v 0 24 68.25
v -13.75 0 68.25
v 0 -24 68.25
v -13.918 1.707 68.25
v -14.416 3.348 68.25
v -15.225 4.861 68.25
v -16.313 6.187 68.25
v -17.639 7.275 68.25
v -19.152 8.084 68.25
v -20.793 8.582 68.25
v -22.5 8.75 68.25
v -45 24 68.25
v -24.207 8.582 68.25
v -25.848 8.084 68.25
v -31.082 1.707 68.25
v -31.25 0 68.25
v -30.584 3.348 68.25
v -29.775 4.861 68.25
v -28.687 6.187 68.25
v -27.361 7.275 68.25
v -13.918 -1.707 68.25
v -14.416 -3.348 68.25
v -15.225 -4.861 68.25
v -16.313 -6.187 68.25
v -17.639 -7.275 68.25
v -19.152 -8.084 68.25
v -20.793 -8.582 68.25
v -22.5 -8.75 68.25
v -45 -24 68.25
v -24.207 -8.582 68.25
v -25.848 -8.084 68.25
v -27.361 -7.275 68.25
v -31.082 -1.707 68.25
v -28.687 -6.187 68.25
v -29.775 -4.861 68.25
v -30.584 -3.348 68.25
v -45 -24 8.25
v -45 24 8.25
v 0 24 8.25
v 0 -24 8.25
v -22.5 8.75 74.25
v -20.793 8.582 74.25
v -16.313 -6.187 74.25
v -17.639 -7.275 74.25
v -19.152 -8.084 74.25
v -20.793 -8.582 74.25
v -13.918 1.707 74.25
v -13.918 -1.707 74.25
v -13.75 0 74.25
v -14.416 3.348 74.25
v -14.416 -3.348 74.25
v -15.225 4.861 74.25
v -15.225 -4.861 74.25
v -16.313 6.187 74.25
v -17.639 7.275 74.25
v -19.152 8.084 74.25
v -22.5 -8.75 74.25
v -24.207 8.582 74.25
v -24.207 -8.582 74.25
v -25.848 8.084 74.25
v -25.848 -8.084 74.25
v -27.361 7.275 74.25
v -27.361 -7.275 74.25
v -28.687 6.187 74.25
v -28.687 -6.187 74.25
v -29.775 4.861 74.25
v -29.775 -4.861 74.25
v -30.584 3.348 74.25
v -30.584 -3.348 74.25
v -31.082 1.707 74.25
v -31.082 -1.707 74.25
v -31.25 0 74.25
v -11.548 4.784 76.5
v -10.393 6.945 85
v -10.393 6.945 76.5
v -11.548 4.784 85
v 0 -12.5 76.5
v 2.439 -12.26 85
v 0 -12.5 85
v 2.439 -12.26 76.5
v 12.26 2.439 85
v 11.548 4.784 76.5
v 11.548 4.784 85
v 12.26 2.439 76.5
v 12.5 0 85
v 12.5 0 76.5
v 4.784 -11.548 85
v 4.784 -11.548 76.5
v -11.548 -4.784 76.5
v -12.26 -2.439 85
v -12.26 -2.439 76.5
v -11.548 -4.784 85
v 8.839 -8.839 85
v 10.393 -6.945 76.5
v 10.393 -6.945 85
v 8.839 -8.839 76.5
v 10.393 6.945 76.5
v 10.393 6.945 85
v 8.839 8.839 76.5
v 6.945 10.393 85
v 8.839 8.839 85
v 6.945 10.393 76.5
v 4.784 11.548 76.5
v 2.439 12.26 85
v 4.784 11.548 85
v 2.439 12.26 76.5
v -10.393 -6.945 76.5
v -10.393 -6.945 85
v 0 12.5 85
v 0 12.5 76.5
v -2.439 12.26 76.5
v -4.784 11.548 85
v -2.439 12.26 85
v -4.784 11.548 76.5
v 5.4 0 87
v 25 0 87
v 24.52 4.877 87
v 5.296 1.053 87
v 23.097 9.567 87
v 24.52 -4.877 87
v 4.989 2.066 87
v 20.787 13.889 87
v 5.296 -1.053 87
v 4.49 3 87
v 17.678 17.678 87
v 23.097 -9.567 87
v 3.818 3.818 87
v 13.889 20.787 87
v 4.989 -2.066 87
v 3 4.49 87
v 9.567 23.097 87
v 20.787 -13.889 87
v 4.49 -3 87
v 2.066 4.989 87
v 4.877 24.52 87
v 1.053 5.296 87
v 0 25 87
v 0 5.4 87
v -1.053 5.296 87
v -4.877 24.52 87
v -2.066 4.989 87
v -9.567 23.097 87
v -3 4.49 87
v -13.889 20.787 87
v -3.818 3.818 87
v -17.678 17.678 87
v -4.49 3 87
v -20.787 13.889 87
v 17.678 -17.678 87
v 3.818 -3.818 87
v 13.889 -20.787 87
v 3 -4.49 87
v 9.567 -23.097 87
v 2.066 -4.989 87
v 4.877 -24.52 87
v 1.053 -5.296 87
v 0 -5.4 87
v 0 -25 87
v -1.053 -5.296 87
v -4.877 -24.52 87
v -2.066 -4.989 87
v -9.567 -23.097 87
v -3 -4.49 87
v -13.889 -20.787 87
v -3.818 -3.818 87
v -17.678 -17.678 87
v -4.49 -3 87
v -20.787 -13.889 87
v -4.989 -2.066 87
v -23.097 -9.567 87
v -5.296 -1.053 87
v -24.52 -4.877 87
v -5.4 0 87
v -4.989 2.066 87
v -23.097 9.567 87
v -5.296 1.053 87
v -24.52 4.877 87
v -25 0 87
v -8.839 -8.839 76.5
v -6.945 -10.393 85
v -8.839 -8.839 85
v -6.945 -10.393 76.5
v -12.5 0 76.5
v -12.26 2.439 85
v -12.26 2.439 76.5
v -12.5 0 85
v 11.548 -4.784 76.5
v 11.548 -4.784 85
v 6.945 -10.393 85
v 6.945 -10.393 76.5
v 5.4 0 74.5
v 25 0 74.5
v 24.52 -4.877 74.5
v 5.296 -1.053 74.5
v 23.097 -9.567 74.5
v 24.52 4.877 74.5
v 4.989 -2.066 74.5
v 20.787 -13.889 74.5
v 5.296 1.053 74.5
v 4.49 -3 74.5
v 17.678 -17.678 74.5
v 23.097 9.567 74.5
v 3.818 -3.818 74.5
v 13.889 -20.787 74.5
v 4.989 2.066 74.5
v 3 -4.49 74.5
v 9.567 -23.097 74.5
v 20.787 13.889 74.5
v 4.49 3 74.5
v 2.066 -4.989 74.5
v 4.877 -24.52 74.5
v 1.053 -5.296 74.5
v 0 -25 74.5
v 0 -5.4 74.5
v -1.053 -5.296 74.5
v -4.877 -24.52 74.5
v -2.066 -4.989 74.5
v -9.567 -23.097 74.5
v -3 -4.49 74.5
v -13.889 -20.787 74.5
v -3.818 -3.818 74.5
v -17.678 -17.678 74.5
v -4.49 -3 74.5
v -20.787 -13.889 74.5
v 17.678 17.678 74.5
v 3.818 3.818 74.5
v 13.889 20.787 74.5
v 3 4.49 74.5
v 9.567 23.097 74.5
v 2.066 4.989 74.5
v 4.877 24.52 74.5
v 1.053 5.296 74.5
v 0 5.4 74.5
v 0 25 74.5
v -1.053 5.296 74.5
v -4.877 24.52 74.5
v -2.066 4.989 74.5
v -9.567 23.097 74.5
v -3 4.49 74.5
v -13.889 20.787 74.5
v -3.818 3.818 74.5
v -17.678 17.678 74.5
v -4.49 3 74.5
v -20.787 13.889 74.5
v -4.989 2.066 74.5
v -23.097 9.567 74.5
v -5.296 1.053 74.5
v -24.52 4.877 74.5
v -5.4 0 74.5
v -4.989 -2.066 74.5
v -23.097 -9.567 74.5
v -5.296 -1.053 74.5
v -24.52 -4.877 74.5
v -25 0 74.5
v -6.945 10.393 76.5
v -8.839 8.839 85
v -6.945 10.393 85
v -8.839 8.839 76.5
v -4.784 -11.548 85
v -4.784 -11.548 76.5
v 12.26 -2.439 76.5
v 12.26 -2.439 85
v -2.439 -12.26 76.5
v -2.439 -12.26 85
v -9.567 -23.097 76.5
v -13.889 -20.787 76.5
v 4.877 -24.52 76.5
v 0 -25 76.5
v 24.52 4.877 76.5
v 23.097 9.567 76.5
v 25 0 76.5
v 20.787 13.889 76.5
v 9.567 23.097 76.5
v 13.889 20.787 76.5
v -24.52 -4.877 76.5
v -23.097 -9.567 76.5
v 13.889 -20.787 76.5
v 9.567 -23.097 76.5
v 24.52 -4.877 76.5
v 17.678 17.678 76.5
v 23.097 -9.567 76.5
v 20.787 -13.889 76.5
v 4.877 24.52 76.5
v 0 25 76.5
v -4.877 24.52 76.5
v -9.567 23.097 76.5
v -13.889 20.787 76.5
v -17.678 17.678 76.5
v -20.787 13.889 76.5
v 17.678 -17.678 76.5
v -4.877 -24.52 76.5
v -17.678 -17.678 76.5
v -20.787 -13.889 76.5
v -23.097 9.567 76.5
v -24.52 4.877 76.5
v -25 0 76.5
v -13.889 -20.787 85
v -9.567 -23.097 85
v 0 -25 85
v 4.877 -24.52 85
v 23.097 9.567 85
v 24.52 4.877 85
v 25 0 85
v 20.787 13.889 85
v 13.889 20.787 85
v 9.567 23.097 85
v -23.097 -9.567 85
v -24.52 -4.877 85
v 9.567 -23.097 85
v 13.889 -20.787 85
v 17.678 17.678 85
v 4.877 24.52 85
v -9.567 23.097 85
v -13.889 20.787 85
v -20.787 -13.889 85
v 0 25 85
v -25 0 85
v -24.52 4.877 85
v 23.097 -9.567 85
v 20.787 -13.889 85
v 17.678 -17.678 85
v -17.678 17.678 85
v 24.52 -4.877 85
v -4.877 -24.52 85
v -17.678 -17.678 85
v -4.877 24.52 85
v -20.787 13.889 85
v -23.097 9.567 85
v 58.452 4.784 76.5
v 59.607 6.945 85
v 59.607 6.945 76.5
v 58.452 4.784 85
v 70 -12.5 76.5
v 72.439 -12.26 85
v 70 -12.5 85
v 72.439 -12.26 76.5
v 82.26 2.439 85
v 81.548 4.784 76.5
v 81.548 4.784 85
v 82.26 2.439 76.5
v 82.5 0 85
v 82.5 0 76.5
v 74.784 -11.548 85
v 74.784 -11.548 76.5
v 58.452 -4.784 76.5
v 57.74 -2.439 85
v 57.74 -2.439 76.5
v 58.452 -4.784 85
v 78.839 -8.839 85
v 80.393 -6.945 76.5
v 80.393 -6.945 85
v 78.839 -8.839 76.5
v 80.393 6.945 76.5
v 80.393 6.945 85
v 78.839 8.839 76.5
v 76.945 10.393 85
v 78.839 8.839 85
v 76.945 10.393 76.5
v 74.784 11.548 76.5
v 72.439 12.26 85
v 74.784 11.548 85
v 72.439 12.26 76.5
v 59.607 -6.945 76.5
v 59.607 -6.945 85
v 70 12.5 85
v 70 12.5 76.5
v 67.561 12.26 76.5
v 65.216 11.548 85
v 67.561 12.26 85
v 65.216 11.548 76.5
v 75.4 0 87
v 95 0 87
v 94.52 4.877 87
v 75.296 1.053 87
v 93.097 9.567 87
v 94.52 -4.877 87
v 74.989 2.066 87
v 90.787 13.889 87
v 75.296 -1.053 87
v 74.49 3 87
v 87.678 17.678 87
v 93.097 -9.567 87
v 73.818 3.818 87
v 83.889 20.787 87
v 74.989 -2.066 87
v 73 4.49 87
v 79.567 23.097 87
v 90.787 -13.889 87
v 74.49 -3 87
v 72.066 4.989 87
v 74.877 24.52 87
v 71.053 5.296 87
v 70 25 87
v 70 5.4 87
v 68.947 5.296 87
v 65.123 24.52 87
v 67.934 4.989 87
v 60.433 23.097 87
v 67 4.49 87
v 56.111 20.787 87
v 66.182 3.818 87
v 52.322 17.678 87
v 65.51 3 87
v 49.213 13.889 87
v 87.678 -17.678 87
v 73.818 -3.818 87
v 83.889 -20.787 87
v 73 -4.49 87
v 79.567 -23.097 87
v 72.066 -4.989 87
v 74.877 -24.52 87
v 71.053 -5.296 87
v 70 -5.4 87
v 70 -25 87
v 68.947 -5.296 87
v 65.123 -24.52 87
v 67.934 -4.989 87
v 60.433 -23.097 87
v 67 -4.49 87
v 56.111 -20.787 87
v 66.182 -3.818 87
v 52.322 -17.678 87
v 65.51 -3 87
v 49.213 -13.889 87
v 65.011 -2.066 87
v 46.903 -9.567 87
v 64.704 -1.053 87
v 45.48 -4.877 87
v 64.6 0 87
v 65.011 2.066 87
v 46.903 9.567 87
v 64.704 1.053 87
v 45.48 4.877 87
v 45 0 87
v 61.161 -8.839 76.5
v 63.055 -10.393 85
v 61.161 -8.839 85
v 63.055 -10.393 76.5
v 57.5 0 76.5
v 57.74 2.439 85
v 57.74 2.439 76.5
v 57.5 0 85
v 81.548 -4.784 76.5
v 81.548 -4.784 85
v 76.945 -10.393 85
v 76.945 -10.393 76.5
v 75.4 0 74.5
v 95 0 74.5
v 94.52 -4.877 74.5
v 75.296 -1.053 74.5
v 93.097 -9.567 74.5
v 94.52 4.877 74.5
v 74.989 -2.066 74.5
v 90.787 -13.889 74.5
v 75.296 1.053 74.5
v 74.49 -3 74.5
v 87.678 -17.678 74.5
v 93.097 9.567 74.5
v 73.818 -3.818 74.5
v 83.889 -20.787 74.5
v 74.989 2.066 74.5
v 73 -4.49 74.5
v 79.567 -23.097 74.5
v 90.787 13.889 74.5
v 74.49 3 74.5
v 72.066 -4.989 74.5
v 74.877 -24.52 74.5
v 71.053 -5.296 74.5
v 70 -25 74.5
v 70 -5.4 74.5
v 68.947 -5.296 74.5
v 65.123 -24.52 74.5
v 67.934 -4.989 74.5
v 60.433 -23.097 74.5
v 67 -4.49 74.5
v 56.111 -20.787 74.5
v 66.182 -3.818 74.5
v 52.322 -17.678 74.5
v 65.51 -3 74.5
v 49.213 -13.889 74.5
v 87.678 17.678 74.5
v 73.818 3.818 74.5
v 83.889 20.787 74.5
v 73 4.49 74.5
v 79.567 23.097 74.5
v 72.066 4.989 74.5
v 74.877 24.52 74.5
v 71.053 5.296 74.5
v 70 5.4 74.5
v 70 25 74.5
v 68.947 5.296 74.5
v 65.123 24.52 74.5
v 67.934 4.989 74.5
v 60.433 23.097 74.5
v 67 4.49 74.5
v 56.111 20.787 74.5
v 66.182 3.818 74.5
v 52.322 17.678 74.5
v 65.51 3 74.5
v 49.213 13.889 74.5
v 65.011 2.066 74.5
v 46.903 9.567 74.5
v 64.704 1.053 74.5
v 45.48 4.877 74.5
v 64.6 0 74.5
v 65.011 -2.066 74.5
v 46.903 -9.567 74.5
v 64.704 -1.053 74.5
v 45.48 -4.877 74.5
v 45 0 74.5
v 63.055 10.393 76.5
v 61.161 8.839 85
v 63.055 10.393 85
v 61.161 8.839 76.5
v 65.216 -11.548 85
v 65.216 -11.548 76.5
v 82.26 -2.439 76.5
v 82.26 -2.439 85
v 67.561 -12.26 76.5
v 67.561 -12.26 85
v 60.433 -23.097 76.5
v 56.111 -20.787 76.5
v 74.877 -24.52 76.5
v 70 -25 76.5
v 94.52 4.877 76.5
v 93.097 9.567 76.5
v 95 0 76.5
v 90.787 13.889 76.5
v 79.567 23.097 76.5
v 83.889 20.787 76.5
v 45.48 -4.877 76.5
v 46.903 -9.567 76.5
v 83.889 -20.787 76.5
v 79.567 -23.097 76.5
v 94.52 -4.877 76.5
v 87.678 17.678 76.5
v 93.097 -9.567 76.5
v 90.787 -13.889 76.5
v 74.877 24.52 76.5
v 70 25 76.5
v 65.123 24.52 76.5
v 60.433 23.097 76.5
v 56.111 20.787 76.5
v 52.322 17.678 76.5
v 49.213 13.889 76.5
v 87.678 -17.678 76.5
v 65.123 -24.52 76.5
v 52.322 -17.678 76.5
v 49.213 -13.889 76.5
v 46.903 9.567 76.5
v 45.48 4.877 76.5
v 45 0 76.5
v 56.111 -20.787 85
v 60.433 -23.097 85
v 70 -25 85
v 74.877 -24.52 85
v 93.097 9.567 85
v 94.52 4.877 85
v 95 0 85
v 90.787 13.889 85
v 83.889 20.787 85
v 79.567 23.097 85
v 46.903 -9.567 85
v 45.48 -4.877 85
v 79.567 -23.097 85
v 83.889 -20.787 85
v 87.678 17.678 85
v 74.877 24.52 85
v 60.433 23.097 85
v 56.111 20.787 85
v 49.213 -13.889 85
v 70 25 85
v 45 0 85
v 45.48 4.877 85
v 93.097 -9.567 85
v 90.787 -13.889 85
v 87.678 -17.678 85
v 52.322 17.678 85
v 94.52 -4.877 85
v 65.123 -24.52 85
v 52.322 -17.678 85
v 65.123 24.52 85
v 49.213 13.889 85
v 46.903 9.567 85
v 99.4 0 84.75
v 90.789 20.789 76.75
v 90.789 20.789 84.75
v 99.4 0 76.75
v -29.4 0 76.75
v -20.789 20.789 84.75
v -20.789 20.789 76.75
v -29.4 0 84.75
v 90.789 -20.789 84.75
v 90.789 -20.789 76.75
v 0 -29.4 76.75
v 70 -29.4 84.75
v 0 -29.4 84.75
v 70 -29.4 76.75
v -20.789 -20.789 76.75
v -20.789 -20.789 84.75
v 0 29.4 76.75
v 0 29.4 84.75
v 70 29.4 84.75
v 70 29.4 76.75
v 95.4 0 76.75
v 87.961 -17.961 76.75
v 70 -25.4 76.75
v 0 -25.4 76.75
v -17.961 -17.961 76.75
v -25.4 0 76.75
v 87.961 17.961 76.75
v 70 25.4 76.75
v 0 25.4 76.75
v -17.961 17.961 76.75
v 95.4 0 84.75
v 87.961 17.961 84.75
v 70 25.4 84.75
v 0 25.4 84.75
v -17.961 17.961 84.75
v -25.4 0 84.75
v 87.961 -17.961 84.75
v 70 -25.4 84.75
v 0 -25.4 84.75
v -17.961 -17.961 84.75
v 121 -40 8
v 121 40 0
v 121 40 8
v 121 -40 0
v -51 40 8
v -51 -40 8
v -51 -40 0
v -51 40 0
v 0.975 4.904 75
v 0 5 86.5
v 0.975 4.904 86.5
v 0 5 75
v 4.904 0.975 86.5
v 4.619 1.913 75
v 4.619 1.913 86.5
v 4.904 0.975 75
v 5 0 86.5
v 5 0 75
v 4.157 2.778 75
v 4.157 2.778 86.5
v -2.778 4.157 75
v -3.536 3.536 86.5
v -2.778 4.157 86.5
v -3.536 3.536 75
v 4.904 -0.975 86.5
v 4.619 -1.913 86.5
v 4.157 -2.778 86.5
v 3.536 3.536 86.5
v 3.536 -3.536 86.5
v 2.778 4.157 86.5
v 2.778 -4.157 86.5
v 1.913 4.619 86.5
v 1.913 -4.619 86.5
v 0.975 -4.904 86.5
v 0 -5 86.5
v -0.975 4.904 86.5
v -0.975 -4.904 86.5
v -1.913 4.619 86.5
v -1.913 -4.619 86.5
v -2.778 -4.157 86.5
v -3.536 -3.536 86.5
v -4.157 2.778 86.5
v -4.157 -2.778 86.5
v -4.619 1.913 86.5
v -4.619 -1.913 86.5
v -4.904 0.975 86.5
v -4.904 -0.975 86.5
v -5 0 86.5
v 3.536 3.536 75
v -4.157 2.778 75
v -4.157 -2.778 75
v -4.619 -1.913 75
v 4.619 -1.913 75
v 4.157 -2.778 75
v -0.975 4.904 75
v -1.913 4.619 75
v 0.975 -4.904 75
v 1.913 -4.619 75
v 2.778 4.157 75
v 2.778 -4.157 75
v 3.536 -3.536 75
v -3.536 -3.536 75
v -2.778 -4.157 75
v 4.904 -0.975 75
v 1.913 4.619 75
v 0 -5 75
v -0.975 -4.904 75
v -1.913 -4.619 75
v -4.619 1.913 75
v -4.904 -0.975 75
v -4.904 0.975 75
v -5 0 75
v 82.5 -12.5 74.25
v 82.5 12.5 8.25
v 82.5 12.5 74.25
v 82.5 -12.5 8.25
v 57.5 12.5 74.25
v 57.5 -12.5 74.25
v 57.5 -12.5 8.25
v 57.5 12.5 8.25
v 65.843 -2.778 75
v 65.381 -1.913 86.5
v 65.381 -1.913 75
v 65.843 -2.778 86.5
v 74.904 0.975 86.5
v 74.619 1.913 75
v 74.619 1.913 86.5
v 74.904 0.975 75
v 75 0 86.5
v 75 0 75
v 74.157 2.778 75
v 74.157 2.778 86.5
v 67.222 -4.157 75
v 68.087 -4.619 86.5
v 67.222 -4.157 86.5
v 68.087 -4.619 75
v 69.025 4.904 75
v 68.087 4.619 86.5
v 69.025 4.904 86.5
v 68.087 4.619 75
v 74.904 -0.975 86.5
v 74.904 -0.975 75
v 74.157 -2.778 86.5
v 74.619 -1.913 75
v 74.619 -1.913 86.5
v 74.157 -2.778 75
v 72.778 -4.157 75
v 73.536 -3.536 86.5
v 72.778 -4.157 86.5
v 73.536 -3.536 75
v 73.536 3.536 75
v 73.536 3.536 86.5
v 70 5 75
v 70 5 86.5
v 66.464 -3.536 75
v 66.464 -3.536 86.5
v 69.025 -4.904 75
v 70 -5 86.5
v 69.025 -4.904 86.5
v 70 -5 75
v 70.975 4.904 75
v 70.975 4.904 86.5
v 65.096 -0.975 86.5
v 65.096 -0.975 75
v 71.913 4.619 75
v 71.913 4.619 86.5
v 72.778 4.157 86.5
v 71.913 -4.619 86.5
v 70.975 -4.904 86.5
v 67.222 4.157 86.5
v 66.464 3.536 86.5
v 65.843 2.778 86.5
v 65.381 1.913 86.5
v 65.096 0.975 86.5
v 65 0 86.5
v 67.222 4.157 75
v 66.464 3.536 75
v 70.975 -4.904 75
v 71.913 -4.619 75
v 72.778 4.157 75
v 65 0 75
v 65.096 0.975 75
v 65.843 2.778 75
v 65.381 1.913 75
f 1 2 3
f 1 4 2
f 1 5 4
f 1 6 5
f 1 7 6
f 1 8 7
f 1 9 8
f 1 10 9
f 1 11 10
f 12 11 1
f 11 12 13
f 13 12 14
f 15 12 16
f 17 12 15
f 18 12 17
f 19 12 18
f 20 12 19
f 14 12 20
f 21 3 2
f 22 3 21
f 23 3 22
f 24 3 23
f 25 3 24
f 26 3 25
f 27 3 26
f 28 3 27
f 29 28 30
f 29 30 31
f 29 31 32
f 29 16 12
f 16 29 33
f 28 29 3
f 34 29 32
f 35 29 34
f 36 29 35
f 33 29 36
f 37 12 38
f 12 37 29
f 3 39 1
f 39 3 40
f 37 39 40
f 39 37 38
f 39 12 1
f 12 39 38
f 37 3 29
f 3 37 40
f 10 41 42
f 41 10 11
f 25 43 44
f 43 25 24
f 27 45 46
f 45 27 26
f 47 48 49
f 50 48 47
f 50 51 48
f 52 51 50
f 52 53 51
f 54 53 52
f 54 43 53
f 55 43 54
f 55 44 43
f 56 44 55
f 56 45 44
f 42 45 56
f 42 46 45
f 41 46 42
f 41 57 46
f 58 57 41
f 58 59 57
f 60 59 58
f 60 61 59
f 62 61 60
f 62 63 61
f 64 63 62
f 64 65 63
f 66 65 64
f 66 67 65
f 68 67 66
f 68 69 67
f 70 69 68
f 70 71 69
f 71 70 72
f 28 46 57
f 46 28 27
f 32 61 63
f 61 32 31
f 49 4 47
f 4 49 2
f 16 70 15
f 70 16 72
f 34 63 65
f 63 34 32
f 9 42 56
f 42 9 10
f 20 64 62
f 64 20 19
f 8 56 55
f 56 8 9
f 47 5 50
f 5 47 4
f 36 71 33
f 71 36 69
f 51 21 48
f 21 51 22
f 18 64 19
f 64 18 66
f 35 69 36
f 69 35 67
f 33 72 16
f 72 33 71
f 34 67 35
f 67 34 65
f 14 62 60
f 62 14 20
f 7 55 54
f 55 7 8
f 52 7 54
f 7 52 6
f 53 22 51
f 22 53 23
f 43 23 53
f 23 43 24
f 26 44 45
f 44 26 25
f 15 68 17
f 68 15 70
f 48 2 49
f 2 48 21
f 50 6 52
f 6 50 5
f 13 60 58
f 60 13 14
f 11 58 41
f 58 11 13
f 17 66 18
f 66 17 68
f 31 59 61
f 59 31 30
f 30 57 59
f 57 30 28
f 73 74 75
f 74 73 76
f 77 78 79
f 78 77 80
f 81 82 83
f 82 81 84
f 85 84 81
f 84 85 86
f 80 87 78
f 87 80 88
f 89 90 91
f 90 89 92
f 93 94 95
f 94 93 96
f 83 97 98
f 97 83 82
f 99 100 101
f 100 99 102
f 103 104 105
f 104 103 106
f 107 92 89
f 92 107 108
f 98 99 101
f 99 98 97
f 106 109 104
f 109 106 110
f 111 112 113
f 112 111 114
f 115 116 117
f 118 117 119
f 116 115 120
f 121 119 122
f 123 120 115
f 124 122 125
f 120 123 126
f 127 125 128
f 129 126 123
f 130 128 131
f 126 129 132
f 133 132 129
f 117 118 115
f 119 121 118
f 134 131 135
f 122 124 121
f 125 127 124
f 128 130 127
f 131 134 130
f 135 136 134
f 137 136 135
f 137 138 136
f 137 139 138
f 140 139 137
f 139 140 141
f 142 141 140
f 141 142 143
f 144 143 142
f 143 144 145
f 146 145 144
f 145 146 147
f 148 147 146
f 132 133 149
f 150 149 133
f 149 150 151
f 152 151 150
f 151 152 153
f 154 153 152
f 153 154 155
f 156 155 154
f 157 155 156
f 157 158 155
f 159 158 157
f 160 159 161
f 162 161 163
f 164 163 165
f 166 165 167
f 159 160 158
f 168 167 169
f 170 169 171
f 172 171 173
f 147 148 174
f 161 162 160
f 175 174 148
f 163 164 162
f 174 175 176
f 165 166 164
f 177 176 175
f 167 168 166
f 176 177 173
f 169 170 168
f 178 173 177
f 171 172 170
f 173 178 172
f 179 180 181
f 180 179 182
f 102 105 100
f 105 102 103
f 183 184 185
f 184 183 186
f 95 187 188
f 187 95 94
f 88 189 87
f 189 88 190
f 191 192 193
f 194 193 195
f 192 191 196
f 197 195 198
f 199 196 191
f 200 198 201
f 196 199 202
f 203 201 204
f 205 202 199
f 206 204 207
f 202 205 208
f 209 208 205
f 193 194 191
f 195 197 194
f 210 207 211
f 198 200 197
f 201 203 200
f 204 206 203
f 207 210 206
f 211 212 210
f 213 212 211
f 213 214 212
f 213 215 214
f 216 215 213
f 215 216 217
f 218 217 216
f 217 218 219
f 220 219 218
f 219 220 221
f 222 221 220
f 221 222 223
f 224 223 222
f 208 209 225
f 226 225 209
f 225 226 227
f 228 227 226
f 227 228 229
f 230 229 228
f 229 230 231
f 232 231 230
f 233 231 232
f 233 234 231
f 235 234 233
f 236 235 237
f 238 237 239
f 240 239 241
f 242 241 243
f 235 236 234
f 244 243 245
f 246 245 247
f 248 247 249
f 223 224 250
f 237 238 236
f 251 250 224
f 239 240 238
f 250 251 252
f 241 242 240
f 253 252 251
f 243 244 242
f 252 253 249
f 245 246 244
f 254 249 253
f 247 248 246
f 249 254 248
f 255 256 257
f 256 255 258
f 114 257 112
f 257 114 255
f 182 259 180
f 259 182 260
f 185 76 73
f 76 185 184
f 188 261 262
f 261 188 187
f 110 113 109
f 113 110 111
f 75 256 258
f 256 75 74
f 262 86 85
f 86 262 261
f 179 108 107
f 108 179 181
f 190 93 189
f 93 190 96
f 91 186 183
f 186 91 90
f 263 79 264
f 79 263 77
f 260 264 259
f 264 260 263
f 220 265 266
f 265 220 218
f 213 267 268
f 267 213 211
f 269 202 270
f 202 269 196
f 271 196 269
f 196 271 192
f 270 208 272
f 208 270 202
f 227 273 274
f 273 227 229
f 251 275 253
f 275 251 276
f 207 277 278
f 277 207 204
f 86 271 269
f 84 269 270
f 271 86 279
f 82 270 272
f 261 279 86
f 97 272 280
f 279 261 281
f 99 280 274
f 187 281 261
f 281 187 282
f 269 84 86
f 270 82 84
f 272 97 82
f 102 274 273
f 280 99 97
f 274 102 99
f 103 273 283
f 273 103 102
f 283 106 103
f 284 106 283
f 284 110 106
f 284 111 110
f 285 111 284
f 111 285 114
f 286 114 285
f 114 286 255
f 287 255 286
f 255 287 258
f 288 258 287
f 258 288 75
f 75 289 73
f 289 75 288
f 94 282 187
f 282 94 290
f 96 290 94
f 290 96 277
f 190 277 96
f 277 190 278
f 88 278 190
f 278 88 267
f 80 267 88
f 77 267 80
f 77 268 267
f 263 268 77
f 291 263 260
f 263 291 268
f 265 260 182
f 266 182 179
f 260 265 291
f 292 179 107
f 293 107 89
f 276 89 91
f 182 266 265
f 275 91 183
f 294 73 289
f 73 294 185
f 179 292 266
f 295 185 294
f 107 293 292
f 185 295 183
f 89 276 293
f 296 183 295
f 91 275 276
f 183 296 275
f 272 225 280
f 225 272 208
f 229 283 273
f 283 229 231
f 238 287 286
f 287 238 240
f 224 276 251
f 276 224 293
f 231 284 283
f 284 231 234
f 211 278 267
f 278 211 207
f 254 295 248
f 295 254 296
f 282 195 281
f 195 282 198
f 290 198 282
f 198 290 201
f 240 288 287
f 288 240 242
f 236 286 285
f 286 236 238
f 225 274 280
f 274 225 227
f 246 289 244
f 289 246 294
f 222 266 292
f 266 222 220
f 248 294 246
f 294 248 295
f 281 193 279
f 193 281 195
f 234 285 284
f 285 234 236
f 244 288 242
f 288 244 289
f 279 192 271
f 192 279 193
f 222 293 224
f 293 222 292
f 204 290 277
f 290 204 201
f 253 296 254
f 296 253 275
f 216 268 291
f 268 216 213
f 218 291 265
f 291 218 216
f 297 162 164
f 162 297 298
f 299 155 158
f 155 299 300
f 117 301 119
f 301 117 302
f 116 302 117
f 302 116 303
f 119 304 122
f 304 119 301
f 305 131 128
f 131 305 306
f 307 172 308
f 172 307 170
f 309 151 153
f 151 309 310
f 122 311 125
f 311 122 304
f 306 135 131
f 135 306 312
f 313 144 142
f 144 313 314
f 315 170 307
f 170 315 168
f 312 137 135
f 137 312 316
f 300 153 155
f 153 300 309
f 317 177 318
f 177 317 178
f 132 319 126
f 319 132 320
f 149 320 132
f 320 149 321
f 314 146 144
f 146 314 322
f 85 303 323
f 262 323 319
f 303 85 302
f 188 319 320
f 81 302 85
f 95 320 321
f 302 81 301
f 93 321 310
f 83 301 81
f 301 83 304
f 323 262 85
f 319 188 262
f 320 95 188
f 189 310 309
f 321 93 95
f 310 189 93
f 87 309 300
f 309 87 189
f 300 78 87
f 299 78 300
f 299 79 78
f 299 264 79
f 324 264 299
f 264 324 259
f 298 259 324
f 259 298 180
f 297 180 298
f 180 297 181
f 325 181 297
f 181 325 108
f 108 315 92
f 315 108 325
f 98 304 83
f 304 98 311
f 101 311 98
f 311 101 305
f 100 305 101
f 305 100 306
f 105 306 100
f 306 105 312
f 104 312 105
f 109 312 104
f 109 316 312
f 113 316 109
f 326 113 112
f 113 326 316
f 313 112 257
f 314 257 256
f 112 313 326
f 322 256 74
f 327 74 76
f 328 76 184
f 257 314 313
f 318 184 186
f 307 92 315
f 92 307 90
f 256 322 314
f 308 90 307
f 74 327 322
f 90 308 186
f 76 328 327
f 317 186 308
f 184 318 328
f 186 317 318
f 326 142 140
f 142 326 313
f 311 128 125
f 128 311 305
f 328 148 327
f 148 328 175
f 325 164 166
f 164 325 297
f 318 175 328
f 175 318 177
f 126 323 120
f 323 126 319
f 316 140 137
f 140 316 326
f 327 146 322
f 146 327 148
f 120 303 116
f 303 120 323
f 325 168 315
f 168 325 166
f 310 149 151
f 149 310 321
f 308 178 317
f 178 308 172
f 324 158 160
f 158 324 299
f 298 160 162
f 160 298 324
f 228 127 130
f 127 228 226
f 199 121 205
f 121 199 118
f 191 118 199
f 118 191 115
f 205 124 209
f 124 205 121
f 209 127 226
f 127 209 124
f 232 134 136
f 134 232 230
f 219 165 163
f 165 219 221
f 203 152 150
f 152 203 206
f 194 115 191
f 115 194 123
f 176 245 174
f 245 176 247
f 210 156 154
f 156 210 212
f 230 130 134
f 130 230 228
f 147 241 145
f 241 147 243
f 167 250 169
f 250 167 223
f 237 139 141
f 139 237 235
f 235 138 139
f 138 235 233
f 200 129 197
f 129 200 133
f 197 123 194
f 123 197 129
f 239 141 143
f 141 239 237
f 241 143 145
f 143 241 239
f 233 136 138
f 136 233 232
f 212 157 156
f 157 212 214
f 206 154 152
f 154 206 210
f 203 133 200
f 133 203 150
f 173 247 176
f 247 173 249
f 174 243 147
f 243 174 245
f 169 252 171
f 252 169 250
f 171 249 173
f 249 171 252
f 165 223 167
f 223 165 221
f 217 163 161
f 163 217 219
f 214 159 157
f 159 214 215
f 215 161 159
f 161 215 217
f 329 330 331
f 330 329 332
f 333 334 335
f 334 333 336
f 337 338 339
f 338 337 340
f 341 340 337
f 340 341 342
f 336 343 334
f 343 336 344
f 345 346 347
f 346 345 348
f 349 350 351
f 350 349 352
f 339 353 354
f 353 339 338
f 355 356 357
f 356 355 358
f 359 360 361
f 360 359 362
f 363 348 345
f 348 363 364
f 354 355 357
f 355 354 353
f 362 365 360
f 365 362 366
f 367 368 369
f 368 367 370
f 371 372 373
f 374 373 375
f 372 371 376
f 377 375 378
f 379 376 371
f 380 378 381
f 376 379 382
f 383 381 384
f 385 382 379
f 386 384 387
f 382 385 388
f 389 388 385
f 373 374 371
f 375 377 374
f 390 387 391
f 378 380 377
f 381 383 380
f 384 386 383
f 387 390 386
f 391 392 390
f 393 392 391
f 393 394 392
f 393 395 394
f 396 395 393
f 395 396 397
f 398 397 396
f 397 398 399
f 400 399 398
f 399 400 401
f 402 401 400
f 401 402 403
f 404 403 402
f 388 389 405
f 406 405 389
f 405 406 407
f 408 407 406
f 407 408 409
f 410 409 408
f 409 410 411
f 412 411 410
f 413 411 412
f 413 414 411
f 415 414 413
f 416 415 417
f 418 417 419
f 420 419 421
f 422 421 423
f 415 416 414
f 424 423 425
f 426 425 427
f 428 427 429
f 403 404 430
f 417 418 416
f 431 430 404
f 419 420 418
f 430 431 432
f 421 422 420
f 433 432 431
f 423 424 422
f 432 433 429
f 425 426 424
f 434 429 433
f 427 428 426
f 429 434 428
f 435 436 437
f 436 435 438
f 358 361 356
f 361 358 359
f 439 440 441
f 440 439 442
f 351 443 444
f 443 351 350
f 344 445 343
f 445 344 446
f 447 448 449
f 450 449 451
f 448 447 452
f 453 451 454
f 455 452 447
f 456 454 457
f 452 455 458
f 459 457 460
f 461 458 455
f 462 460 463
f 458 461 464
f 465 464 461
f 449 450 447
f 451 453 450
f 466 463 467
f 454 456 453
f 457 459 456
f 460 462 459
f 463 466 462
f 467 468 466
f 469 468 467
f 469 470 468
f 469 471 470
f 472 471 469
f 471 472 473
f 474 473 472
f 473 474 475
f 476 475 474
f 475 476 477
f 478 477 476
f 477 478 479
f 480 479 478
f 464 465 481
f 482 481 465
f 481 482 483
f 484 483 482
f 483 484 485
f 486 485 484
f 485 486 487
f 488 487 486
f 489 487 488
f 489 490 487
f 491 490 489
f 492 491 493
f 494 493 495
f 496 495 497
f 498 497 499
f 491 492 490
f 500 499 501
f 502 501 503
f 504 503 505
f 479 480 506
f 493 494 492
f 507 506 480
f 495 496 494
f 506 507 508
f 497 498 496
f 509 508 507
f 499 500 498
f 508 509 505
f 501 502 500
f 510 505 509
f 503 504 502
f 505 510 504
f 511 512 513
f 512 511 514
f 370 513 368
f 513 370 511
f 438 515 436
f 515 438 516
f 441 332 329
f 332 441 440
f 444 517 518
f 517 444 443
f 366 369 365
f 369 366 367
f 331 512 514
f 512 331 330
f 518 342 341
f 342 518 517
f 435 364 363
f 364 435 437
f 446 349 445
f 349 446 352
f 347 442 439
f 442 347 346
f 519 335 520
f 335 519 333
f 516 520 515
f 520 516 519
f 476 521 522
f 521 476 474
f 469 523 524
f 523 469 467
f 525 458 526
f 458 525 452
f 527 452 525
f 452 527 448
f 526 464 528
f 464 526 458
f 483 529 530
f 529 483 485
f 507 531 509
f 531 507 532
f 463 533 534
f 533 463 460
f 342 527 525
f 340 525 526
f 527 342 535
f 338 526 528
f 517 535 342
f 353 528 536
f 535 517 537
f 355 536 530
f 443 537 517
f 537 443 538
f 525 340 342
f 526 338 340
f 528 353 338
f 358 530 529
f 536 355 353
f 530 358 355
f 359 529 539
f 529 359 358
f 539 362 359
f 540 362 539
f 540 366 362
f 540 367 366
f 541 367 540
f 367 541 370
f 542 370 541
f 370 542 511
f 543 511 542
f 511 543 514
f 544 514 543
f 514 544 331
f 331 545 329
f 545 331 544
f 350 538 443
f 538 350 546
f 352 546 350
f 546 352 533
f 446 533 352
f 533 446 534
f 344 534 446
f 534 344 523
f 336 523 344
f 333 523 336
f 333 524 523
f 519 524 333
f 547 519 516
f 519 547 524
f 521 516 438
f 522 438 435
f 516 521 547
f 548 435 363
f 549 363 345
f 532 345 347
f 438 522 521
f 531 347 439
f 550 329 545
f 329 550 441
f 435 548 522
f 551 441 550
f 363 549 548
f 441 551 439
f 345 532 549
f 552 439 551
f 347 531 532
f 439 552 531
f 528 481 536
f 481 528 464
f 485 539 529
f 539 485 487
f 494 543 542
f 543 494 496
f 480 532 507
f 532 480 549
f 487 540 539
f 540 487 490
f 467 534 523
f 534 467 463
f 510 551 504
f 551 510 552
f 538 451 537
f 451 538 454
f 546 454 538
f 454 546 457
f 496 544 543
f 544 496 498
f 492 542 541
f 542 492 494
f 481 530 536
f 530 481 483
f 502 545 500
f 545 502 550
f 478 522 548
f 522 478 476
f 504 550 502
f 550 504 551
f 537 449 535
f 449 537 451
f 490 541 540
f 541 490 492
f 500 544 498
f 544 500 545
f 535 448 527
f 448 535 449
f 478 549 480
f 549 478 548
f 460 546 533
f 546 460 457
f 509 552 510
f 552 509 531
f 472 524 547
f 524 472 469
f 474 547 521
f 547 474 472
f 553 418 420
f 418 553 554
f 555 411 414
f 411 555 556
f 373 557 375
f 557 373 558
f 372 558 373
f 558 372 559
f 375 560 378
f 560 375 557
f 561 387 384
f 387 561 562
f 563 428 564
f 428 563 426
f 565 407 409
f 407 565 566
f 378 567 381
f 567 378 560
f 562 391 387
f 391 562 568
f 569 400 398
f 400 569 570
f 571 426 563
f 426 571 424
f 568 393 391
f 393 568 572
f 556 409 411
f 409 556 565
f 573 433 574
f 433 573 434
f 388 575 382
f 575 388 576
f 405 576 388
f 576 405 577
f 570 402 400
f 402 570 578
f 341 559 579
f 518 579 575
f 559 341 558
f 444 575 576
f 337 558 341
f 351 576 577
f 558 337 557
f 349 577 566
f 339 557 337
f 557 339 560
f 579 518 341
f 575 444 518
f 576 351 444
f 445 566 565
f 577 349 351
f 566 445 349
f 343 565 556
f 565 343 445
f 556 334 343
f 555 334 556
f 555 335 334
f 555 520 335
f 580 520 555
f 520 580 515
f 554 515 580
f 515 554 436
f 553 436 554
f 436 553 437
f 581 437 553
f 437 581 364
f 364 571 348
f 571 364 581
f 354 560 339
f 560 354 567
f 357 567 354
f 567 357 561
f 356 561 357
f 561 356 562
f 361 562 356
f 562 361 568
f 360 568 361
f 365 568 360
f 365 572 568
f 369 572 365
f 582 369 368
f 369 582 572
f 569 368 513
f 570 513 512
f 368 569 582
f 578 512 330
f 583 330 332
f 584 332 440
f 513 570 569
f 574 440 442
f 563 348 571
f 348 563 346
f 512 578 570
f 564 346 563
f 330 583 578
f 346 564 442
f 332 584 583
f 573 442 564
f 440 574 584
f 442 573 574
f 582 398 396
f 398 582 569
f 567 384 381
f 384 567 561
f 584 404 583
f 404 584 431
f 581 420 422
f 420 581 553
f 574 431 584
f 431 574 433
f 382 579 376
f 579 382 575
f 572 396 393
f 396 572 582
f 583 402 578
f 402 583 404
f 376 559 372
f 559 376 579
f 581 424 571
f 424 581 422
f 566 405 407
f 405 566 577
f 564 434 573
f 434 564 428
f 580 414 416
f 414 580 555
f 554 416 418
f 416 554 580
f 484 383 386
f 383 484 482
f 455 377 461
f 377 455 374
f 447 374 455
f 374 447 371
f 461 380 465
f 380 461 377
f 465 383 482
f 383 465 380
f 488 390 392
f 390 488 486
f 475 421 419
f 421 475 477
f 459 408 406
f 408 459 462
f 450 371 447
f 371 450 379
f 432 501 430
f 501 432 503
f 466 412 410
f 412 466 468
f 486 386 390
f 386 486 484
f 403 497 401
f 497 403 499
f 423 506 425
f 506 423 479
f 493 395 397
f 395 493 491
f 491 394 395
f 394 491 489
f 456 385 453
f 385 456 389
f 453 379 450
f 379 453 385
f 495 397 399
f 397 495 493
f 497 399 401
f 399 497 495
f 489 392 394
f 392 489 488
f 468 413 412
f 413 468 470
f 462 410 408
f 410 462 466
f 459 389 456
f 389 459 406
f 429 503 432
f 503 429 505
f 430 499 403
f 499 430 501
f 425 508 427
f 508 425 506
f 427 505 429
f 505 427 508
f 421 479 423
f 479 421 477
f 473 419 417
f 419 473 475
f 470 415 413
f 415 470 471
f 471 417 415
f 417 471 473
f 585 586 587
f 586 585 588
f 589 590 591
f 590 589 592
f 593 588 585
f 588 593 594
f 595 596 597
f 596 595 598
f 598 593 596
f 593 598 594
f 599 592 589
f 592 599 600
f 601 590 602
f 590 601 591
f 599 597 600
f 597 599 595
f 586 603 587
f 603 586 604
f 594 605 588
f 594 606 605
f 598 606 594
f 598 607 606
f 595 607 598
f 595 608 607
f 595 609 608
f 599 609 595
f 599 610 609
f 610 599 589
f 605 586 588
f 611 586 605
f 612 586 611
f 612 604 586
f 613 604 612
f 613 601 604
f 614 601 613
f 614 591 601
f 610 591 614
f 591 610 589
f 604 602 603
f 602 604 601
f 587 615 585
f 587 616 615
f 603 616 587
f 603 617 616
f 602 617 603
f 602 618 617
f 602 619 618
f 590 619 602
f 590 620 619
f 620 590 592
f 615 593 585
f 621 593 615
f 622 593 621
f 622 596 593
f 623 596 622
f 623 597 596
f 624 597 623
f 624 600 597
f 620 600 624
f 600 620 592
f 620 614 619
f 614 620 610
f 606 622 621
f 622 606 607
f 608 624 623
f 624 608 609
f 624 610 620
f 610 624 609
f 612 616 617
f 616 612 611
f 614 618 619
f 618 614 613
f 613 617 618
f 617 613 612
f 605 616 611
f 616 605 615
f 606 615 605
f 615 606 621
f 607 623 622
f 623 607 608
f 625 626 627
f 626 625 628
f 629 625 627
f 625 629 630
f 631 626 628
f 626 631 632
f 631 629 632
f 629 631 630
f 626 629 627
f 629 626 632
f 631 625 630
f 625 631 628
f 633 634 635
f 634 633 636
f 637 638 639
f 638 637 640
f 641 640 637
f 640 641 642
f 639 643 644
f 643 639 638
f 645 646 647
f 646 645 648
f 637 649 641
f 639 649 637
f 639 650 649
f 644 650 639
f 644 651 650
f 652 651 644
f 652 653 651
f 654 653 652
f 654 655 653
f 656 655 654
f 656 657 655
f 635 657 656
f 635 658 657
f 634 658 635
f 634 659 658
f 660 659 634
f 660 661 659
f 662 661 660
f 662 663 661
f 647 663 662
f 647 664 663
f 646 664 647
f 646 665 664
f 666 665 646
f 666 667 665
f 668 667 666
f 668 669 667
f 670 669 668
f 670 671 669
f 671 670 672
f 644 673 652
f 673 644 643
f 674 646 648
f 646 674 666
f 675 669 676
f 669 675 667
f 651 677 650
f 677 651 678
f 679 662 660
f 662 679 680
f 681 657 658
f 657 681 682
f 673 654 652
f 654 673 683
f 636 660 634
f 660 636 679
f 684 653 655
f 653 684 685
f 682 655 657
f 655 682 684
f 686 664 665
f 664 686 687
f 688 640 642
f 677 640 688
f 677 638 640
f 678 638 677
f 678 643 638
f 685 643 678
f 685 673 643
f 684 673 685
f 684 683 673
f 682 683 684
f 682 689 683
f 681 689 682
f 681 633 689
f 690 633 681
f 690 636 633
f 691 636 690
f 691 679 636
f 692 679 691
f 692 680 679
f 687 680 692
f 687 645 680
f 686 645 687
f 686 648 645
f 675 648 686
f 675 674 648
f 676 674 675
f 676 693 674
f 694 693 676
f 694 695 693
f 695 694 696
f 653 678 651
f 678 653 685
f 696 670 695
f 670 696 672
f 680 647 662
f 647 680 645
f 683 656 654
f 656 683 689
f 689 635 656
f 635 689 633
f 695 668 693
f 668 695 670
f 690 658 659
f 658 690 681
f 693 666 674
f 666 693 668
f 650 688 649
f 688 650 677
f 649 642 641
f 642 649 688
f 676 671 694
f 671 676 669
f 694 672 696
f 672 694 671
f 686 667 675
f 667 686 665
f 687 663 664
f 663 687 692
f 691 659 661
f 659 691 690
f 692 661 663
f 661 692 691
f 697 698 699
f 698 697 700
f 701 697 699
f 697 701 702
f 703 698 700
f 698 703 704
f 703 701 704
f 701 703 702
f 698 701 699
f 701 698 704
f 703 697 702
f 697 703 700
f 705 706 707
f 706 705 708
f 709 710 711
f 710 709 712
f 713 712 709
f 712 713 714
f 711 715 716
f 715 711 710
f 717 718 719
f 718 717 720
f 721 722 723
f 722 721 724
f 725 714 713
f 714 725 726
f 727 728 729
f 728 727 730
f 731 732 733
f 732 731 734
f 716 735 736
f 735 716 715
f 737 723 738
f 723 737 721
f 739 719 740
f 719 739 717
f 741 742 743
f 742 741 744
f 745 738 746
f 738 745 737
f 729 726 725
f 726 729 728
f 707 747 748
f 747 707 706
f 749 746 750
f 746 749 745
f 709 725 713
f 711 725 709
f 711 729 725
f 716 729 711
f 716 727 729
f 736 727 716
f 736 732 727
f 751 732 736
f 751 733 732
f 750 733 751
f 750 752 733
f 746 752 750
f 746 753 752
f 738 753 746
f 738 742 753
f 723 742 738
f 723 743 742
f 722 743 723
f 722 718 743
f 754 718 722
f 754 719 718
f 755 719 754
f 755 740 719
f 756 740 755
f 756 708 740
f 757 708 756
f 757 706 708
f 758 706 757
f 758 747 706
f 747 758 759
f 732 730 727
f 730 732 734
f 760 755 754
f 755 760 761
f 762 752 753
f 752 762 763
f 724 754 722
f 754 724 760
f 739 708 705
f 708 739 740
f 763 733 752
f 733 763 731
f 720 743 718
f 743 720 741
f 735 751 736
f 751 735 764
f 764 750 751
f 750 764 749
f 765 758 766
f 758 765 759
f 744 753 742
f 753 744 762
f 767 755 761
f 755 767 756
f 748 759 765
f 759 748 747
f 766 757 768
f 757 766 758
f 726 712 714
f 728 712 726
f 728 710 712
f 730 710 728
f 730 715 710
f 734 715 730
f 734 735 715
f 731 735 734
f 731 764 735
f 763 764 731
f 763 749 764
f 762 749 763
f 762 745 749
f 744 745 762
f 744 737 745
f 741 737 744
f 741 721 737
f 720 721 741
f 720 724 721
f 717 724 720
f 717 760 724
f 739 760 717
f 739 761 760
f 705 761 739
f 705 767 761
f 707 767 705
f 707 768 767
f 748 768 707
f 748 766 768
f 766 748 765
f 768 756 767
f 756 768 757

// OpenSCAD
$fn = 32;

// ------------------------------------------------------------------------
// Motor belt drive: span 70 mm, pulleys d50, belt 8 mm wide
// Every part is its own module, assembly() places every instance.
// ------------------------------------------------------------------------

// --- part 1 ---
module base_plate() {
  difference() {
    translate([-86, -40, 0]) cube([172, 80, 8]);
  }
}

// --- part 2 ---
module motor() {
  union() {
    translate([-30, -24, 0]) cube([60, 48, 45]);
    translate([33, 0, 22.5]) rotate([0, 90, 0]) cylinder(h = 6, d = 17.5, center = true);
  }
}

// --- part 3 ---
module drive_shaft() {
  translate([0, 0, -5.75]) cylinder(h = 11.5, d = 10);
}

// --- part 4 ---
module pulley_drive() {
  difference() {
    union() {
      cylinder(h = 12.5, d = 25);
      cylinder(h = 2, d = 50);
      translate([0, 0, 10.5]) cylinder(h = 2, d = 50);
    }
    translate([0, 0, -1]) cylinder(h = 14.5, d = 10.8);
  }
}

// --- part 5 ---
module idler_post() {
  translate([-12.5, -12.5, 0]) cube([25, 25, 66]);
}

// --- part 6 ---
module driven_shaft() {
  translate([0, 0, -5.75]) cylinder(h = 11.5, d = 10);
}

// --- part 7 ---
module pulley_driven() {
  difference() {
    union() {
      cylinder(h = 12.5, d = 25);
      cylinder(h = 2, d = 50);
      translate([0, 0, 10.5]) cylinder(h = 2, d = 50);
    }
    translate([0, 0, -1]) cylinder(h = 14.5, d = 10.8);
  }
}

// --- part 8 ---
module drive_belt() {
  difference() {
    linear_extrude(height = 8) polygon(points = concat([for (a = [90 : 45 : 270]) [29.4 * cos(a), 29.4 * sin(a)]], [for (a = [270 : 45 : 450]) [70 + 29.4 * cos(a), 29.4 * sin(a)]]));
    translate([0, 0, -1]) linear_extrude(height = 10) polygon(points = concat([for (a = [90 : 45 : 270]) [25.4 * cos(a), 25.4 * sin(a)]], [for (a = [270 : 45 : 450]) [70 + 25.4 * cos(a), 25.4 * sin(a)]]));
  }
}

// --- assembly ---
module assembly() {
  color([0.80, 0.24, 0.20]) translate([35, 0, 0]) rotate([0, 0, 0]) base_plate();
  color([0.20, 0.45, 0.75]) translate([0, 0, 38.25]) rotate([0, 270, 0]) motor();
  color([0.25, 0.62, 0.32]) translate([0, 0, 80.75]) rotate([0, 0, 0]) drive_shaft();
  color([0.92, 0.70, 0.18]) translate([0, 0, 74.5]) rotate([0, 0, 0]) pulley_drive();
  color([0.58, 0.35, 0.70]) translate([70, 0, 8.25]) rotate([0, 0, 0]) idler_post();
  color([0.16, 0.66, 0.66]) translate([70, 0, 80.75]) rotate([0, 0, 0]) driven_shaft();
  color([0.85, 0.48, 0.18]) translate([70, 0, 74.5]) rotate([0, 0, 0]) pulley_driven();
  color([0.55, 0.60, 0.65]) translate([0, 0, 76.75]) rotate([0, 0, 0]) drive_belt();
}

assembly();
